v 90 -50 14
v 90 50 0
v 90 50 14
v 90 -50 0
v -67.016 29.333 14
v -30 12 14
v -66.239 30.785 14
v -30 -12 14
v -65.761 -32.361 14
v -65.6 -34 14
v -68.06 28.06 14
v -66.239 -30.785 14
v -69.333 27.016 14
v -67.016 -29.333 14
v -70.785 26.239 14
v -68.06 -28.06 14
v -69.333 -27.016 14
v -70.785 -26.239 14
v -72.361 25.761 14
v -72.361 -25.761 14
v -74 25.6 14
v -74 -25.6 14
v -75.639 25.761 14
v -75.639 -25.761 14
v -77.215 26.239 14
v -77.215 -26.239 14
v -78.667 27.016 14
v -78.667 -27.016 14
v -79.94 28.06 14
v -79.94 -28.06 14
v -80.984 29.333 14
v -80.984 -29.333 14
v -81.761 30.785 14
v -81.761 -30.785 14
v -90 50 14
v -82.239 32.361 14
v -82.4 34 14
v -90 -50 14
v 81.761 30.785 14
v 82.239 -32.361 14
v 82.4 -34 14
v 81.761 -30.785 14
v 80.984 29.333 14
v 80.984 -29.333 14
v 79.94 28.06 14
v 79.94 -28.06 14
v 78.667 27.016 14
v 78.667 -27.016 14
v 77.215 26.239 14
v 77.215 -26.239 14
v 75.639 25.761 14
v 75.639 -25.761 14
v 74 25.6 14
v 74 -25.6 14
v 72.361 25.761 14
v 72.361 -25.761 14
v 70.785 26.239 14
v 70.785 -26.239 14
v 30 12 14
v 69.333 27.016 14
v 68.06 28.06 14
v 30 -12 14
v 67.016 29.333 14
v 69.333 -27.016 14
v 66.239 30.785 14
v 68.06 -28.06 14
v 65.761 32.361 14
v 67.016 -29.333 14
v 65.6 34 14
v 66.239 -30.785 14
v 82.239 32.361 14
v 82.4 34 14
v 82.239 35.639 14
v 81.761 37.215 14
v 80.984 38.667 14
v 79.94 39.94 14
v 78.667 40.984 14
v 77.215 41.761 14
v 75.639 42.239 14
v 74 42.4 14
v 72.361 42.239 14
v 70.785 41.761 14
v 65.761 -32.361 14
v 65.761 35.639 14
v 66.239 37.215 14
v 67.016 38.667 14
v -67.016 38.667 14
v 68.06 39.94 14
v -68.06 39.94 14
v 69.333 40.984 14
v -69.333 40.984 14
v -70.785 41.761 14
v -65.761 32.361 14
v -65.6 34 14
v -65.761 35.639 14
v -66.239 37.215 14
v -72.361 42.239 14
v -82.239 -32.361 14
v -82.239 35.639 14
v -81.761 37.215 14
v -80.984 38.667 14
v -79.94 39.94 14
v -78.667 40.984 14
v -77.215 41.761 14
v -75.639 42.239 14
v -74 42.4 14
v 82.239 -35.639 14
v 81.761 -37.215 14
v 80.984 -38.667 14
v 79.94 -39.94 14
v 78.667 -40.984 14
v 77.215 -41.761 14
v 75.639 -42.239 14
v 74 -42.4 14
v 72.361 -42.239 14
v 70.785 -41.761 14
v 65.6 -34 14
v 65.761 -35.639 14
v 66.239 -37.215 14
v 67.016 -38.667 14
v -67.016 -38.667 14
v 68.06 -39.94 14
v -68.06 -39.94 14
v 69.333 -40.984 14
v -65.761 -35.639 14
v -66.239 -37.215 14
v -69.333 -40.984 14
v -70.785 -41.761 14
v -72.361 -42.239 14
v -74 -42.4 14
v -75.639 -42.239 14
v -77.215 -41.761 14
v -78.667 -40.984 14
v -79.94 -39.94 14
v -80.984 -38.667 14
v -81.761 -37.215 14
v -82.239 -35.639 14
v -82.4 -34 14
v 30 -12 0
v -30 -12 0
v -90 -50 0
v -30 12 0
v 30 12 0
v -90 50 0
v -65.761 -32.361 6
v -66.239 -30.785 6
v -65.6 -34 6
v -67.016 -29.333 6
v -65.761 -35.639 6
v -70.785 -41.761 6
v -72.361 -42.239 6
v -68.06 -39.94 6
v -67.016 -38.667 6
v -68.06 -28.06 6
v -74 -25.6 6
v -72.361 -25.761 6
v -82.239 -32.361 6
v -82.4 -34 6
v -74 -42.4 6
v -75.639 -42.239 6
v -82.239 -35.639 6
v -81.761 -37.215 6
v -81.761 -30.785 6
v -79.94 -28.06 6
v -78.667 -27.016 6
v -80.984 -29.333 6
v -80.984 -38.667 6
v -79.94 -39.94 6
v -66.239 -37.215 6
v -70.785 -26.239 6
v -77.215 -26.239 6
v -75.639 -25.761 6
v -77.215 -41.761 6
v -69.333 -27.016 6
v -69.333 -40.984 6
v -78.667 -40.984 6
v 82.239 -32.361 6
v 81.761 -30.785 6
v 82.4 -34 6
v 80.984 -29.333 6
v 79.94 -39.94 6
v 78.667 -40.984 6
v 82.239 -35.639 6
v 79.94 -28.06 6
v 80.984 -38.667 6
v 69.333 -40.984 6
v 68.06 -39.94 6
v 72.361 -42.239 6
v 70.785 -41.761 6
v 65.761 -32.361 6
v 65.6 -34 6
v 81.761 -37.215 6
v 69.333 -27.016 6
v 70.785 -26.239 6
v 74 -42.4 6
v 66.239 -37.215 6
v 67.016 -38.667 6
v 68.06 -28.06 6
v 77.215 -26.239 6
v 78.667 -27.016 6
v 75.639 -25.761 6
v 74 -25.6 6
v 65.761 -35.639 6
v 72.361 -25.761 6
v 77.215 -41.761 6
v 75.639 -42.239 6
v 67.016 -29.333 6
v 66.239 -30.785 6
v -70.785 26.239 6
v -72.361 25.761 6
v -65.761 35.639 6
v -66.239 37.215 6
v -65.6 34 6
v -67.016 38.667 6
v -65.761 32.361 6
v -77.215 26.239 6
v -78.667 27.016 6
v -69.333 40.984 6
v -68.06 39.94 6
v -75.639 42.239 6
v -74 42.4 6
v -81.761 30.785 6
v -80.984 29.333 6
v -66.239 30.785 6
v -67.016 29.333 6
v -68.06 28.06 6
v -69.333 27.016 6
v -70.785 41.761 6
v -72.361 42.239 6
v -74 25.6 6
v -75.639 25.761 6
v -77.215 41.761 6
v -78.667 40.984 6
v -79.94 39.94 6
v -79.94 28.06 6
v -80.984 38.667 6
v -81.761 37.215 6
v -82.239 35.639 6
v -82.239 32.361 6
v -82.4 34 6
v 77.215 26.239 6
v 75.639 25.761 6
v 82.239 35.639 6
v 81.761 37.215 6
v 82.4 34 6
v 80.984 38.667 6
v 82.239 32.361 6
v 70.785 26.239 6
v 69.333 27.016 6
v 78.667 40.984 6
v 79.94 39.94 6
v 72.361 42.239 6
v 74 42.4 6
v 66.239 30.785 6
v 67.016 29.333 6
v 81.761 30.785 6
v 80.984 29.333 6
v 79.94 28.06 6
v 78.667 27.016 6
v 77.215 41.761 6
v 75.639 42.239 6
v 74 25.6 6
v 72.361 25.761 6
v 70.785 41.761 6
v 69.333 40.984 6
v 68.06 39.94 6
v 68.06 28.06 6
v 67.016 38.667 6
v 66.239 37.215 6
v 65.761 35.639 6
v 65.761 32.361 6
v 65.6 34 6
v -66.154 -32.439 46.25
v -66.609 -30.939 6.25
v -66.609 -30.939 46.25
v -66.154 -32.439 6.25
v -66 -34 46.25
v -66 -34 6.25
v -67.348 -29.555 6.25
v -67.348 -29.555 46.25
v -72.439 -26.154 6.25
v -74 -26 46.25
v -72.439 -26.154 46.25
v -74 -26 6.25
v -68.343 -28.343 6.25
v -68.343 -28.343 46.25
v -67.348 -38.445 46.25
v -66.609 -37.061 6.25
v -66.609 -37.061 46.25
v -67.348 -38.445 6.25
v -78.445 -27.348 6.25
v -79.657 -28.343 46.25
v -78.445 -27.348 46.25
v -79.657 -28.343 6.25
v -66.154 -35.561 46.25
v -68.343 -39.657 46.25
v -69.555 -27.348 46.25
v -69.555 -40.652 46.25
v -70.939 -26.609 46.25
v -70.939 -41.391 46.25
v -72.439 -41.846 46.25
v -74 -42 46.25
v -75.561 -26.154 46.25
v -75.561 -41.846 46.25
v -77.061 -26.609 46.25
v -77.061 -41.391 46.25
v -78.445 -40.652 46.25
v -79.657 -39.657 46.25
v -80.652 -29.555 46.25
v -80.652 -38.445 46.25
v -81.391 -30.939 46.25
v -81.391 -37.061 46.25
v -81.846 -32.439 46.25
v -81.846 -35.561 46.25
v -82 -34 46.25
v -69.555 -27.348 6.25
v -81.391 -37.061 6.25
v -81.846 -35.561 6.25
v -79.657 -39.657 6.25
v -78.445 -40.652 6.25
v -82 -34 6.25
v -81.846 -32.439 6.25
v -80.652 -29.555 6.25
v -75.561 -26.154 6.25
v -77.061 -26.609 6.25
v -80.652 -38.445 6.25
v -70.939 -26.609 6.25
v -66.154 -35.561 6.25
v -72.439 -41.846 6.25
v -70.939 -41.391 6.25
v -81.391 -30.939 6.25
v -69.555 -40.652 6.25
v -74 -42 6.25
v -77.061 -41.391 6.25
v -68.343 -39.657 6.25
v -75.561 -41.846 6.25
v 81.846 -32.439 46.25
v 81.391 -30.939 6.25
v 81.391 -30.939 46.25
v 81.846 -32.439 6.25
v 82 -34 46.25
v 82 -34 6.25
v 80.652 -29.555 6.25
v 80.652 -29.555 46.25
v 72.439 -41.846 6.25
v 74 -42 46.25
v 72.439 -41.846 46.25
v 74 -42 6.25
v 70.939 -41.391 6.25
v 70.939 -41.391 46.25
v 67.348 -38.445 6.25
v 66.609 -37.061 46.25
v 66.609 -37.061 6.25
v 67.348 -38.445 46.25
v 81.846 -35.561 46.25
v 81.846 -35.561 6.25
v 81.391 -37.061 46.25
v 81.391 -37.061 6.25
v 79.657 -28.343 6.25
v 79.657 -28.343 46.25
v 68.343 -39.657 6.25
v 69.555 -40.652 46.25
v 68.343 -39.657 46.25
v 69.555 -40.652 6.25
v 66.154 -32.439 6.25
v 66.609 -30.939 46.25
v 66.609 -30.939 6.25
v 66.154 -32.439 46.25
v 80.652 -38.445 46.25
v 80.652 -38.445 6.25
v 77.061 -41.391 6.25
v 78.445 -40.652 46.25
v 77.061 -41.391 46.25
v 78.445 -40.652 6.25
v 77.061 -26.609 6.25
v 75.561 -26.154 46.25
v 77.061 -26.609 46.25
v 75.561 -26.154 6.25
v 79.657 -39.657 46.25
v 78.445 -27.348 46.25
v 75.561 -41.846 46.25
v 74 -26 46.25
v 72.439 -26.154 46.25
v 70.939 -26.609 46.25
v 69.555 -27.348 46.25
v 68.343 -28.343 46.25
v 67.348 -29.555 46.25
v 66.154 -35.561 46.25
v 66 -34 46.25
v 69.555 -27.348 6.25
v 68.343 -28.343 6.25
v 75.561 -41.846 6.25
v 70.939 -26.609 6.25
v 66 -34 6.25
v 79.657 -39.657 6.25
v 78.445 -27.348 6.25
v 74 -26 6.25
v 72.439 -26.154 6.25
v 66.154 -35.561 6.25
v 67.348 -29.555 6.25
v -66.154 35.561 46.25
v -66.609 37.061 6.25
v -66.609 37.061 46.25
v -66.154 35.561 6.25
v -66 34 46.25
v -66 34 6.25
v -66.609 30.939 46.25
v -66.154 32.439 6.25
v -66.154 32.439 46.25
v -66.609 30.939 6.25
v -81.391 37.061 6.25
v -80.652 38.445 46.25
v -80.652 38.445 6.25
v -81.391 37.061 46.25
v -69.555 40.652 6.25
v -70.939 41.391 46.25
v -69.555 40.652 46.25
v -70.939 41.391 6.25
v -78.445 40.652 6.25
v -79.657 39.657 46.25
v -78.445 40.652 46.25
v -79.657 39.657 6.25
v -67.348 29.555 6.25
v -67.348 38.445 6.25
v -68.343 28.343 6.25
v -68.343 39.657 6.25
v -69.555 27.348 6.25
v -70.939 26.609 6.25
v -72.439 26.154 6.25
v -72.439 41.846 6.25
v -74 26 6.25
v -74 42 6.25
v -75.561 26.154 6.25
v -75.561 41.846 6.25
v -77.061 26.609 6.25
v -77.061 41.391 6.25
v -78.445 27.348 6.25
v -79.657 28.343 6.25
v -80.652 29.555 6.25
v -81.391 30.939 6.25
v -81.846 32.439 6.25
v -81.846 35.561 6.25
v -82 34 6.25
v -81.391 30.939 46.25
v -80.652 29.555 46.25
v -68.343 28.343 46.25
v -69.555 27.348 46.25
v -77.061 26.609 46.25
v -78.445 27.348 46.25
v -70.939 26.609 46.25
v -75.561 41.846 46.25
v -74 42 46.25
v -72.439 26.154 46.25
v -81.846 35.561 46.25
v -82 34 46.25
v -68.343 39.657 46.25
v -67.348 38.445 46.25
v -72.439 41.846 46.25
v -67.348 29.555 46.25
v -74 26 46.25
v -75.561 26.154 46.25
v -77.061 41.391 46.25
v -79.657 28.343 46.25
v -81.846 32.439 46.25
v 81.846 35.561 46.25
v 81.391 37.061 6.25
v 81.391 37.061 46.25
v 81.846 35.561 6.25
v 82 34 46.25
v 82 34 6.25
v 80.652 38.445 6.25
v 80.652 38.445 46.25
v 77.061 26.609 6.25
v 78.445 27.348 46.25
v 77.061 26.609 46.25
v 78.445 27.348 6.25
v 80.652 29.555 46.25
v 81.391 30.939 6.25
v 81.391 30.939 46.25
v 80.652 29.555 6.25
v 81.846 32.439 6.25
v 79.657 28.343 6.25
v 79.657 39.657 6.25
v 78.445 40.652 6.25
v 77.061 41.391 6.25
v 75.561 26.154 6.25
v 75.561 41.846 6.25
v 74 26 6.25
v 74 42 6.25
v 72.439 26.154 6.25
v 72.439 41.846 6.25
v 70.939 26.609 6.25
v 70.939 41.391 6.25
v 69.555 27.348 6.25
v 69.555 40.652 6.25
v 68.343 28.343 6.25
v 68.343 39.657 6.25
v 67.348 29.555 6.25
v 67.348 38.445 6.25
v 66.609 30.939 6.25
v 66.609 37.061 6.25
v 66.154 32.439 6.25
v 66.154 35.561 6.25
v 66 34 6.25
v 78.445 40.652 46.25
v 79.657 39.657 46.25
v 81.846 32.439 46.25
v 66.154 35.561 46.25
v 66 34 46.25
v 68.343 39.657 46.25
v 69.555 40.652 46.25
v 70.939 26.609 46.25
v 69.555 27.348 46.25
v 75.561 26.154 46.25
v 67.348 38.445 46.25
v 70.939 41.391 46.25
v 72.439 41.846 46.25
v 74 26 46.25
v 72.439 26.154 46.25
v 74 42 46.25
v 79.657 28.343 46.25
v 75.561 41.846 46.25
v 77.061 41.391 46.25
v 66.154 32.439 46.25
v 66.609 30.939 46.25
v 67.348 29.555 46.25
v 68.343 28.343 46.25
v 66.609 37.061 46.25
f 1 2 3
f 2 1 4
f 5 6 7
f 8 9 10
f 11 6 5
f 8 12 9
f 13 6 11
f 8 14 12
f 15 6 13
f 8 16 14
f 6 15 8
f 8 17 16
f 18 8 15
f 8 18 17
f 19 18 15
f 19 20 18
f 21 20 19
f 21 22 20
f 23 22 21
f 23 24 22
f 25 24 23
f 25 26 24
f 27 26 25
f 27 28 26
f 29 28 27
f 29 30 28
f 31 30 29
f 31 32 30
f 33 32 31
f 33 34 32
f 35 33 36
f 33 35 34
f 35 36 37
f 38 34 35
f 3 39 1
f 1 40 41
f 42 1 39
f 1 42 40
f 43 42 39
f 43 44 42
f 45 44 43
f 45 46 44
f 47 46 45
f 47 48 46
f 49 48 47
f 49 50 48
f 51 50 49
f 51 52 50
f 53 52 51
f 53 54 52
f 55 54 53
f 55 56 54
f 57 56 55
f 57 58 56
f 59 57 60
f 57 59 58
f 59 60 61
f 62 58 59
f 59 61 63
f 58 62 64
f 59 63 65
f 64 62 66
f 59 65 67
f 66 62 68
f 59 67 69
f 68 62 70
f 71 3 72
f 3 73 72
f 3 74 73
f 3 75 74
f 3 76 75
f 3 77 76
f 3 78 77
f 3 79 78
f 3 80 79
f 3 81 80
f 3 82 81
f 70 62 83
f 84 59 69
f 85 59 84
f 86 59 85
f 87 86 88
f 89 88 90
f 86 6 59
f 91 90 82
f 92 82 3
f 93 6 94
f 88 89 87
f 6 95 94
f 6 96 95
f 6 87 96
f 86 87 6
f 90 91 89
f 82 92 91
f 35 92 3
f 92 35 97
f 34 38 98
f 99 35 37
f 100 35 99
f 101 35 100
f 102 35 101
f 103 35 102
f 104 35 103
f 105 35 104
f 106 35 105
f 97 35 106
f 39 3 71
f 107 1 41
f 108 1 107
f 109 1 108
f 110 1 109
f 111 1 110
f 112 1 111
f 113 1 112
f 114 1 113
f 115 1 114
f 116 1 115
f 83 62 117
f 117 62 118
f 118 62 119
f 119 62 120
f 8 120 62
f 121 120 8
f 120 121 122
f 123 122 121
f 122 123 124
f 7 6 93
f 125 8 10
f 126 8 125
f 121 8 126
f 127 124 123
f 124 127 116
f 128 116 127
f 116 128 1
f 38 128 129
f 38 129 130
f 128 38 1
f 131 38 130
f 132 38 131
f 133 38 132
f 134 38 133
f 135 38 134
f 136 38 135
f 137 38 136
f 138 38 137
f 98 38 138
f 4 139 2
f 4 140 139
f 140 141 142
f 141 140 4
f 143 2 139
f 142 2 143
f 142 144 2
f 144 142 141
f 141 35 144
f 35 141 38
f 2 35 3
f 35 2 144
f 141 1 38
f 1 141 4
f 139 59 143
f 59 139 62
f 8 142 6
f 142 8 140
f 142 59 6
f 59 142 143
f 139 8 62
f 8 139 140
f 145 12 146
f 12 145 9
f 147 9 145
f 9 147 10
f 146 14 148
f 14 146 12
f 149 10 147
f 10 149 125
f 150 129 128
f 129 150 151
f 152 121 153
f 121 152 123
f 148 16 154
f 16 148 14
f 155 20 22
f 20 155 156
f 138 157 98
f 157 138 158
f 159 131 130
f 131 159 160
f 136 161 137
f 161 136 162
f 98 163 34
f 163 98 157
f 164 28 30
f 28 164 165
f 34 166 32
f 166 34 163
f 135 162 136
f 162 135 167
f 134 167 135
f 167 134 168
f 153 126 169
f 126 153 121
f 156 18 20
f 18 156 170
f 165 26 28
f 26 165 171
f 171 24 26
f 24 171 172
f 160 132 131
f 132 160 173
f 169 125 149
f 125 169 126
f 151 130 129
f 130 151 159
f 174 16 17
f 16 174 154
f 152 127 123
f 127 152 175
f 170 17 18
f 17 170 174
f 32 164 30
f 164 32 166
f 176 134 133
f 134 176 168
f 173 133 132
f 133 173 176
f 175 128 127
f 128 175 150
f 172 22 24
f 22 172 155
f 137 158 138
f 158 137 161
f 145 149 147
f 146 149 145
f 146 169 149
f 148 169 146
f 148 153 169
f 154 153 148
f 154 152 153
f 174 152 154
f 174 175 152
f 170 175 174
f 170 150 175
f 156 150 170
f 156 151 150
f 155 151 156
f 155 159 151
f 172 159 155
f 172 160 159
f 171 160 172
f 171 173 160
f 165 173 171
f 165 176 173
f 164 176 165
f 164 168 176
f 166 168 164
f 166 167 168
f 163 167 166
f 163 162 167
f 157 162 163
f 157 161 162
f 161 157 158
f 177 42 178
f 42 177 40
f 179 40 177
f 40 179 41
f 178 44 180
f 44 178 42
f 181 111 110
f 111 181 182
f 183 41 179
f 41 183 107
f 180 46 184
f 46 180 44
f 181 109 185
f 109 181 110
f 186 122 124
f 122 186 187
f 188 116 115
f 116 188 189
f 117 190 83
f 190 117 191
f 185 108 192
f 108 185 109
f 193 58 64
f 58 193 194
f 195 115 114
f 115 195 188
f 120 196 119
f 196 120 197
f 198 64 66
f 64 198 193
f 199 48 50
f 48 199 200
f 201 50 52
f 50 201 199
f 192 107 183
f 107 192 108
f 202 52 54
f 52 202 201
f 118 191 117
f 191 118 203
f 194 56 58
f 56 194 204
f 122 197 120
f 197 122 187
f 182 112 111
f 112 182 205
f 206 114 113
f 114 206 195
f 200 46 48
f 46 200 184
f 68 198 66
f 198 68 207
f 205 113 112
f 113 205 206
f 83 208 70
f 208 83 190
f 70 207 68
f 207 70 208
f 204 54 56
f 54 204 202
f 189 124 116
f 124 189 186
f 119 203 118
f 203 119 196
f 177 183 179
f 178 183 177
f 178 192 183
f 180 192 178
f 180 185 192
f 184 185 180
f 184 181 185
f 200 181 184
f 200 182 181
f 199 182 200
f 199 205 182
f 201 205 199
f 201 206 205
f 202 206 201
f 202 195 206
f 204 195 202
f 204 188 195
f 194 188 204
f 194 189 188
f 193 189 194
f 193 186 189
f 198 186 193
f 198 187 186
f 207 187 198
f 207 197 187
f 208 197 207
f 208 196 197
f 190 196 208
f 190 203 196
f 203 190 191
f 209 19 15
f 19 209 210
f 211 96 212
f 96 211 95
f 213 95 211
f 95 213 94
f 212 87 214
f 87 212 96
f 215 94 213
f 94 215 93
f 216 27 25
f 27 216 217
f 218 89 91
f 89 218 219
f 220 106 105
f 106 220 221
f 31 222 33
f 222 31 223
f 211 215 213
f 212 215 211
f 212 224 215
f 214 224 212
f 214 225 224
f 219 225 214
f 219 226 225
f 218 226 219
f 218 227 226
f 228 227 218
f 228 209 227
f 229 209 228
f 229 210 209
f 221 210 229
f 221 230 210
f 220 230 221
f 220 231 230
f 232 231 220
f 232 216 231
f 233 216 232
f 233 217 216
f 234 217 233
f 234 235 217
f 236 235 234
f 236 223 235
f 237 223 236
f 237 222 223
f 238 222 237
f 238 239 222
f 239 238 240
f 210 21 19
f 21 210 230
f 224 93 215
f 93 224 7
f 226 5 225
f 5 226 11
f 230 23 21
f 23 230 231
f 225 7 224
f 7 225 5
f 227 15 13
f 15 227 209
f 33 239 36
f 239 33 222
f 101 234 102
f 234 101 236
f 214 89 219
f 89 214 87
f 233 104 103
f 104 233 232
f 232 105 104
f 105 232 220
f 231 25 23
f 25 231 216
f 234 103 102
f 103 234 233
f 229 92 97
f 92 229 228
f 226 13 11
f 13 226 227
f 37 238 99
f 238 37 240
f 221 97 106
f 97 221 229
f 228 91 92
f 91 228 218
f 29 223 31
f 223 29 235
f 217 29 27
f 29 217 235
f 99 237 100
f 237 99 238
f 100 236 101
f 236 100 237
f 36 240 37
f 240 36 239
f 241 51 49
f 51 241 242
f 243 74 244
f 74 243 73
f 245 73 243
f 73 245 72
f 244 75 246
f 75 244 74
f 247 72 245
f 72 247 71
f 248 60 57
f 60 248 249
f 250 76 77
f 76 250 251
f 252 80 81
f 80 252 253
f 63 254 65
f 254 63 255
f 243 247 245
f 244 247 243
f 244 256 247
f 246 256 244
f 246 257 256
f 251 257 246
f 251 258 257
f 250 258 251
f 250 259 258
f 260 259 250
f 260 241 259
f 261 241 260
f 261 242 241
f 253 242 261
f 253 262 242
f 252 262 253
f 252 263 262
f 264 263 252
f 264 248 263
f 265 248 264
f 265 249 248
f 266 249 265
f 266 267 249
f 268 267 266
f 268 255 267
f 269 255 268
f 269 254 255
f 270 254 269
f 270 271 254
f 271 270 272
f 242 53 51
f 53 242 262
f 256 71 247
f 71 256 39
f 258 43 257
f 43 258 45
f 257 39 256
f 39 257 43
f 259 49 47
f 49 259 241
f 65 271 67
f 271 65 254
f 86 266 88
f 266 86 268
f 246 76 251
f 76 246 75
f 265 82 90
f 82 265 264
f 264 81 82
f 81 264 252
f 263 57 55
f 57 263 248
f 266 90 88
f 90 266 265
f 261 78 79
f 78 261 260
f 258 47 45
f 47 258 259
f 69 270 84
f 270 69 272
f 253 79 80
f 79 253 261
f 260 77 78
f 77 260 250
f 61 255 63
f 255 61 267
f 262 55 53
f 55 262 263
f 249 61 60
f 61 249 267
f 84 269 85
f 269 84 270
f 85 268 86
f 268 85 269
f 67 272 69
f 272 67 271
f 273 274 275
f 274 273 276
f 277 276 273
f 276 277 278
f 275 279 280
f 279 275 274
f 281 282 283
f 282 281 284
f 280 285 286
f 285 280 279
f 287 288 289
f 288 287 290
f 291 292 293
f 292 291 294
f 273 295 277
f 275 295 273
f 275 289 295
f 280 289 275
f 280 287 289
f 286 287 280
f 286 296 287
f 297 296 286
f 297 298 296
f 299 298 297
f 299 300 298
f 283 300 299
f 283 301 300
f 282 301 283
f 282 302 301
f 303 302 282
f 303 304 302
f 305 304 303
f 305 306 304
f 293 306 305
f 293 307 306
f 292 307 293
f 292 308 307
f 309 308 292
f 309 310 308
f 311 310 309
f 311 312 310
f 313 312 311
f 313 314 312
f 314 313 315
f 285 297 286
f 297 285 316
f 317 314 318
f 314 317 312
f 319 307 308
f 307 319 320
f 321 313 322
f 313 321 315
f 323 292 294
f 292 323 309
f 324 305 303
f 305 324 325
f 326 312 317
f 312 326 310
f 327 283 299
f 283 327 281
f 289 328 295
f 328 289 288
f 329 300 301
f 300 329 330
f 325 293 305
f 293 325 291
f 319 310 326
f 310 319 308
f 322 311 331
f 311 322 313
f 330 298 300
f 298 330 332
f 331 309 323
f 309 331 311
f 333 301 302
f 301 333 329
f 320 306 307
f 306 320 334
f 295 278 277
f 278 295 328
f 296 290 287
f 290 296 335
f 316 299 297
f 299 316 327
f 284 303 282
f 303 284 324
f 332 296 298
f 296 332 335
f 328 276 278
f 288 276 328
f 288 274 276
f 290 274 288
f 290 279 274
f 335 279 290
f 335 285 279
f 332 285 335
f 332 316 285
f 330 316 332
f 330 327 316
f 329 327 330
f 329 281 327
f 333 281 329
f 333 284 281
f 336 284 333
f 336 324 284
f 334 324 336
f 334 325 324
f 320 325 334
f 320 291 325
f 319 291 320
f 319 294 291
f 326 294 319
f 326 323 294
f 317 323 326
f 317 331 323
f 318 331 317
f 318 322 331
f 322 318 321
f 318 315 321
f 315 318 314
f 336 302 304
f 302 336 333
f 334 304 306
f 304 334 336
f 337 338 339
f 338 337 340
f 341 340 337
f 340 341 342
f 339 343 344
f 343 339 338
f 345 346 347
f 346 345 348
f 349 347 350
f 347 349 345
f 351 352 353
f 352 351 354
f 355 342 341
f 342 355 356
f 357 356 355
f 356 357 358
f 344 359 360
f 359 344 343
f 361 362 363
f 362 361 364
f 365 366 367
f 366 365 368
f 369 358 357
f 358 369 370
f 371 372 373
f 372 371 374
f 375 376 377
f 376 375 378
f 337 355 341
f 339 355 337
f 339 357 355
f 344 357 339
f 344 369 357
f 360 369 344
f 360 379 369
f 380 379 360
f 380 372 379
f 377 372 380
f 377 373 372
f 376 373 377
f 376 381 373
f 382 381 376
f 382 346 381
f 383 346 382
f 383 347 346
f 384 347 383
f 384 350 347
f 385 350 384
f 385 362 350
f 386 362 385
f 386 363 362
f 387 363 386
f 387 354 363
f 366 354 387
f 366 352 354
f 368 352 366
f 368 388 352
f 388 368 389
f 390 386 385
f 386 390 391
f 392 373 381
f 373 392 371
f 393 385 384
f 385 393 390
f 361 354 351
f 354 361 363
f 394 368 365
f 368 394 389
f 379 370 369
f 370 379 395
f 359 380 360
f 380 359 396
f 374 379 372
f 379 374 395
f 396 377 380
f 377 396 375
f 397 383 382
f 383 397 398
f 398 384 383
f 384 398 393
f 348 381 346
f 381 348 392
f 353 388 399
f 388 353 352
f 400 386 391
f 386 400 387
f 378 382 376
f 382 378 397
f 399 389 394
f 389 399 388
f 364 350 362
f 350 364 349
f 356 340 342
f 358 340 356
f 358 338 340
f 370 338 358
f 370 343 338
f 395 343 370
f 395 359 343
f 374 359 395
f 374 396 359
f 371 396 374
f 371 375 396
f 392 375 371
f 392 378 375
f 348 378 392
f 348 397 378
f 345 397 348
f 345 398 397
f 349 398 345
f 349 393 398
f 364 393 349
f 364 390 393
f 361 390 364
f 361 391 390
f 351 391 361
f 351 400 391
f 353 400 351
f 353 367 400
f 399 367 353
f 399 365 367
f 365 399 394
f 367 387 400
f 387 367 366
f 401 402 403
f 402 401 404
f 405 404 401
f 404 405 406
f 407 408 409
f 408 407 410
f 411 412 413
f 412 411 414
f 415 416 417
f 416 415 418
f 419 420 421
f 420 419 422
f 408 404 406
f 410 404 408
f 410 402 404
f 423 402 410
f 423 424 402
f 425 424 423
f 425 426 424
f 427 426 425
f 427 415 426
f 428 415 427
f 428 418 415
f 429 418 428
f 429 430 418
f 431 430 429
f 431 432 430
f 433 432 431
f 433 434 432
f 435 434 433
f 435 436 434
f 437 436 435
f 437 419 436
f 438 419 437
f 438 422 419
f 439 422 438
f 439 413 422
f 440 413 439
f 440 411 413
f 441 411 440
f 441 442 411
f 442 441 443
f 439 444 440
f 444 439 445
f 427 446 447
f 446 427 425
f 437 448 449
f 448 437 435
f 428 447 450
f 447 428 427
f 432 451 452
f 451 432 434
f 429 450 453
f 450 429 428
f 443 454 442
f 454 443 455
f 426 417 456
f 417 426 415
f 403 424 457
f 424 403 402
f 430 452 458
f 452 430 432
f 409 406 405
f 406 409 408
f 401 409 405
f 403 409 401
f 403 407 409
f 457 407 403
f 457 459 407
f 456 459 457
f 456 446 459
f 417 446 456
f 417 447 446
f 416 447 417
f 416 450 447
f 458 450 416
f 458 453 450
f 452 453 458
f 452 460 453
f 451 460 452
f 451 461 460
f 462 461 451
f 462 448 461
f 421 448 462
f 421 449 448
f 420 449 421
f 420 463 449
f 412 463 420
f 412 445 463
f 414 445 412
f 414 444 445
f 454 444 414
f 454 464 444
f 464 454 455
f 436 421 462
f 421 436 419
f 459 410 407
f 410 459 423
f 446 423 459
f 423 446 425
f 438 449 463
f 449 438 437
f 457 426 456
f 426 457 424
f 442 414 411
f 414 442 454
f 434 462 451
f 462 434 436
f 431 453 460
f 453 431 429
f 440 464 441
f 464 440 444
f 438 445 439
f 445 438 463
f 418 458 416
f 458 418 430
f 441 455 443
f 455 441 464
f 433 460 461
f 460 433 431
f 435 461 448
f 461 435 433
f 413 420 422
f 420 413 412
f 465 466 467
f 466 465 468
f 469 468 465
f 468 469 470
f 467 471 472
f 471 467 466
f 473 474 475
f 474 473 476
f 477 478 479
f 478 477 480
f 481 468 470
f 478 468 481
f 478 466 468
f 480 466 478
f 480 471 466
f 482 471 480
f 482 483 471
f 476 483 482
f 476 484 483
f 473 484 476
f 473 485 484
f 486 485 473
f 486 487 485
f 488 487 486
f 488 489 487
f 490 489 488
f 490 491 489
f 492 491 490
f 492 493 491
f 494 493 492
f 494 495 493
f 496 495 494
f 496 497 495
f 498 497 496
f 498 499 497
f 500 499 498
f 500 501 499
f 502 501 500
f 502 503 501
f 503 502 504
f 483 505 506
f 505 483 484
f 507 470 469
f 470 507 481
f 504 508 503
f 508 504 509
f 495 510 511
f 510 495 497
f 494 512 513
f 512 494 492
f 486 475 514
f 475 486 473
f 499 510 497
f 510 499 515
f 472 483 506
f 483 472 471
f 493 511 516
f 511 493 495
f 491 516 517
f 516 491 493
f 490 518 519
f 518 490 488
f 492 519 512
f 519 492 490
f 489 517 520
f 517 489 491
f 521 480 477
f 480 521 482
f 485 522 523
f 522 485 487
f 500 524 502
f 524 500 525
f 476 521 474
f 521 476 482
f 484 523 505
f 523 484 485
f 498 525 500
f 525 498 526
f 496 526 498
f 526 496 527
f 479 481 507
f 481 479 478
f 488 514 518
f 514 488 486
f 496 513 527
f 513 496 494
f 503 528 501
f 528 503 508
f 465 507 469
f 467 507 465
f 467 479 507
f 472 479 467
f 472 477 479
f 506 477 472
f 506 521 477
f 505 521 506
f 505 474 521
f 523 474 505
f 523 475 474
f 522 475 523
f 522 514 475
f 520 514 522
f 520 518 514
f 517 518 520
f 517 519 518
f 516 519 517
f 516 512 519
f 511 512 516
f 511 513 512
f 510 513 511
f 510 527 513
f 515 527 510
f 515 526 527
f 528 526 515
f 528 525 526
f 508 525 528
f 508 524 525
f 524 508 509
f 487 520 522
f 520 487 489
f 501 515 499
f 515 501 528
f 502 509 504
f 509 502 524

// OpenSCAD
$fn = 32;

// ------------------------------------------------------------------------
// Frame with four posts: 180 x 100 mm frame, four d16 posts
// Every part is its own module, assembly() places them once.
// ------------------------------------------------------------------------

// --- part 1 ---
module base_frame() {
  difference() {
    translate([-90, -50, 0]) cube([180, 100, 14]);
    translate([-30, -12, -1]) cube([60, 24, 16]);
    translate([-74, -34, 6]) cylinder(h = 9, d = 16.8);
    translate([74, -34, 6]) cylinder(h = 9, d = 16.8);
    translate([-74, 34, 6]) cylinder(h = 9, d = 16.8);
    translate([74, 34, 6]) cylinder(h = 9, d = 16.8);
  }
}

// --- part 2 ---
module post1() {
  cylinder(h = 40, d = 16);
}

// --- part 3 ---
module post2() {
  cylinder(h = 40, d = 16);
}

// --- part 4 ---
module post3() {
  cylinder(h = 40, d = 16);
}

// --- part 5 ---
module post4() {
  cylinder(h = 40, d = 16);
}

// --- assembly ---
module assembly() {
  translate([0, 0, 0]) rotate([0, 0, 0]) base_frame();
  translate([-74, -34, 6.25]) rotate([0, 0, 0]) post1();
  translate([74, -34, 6.25]) rotate([0, 0, 0]) post2();
  translate([-74, 34, 6.25]) rotate([0, 0, 0]) post3();
  translate([74, 34, 6.25]) rotate([0, 0, 0]) post4();
}

assembly();
